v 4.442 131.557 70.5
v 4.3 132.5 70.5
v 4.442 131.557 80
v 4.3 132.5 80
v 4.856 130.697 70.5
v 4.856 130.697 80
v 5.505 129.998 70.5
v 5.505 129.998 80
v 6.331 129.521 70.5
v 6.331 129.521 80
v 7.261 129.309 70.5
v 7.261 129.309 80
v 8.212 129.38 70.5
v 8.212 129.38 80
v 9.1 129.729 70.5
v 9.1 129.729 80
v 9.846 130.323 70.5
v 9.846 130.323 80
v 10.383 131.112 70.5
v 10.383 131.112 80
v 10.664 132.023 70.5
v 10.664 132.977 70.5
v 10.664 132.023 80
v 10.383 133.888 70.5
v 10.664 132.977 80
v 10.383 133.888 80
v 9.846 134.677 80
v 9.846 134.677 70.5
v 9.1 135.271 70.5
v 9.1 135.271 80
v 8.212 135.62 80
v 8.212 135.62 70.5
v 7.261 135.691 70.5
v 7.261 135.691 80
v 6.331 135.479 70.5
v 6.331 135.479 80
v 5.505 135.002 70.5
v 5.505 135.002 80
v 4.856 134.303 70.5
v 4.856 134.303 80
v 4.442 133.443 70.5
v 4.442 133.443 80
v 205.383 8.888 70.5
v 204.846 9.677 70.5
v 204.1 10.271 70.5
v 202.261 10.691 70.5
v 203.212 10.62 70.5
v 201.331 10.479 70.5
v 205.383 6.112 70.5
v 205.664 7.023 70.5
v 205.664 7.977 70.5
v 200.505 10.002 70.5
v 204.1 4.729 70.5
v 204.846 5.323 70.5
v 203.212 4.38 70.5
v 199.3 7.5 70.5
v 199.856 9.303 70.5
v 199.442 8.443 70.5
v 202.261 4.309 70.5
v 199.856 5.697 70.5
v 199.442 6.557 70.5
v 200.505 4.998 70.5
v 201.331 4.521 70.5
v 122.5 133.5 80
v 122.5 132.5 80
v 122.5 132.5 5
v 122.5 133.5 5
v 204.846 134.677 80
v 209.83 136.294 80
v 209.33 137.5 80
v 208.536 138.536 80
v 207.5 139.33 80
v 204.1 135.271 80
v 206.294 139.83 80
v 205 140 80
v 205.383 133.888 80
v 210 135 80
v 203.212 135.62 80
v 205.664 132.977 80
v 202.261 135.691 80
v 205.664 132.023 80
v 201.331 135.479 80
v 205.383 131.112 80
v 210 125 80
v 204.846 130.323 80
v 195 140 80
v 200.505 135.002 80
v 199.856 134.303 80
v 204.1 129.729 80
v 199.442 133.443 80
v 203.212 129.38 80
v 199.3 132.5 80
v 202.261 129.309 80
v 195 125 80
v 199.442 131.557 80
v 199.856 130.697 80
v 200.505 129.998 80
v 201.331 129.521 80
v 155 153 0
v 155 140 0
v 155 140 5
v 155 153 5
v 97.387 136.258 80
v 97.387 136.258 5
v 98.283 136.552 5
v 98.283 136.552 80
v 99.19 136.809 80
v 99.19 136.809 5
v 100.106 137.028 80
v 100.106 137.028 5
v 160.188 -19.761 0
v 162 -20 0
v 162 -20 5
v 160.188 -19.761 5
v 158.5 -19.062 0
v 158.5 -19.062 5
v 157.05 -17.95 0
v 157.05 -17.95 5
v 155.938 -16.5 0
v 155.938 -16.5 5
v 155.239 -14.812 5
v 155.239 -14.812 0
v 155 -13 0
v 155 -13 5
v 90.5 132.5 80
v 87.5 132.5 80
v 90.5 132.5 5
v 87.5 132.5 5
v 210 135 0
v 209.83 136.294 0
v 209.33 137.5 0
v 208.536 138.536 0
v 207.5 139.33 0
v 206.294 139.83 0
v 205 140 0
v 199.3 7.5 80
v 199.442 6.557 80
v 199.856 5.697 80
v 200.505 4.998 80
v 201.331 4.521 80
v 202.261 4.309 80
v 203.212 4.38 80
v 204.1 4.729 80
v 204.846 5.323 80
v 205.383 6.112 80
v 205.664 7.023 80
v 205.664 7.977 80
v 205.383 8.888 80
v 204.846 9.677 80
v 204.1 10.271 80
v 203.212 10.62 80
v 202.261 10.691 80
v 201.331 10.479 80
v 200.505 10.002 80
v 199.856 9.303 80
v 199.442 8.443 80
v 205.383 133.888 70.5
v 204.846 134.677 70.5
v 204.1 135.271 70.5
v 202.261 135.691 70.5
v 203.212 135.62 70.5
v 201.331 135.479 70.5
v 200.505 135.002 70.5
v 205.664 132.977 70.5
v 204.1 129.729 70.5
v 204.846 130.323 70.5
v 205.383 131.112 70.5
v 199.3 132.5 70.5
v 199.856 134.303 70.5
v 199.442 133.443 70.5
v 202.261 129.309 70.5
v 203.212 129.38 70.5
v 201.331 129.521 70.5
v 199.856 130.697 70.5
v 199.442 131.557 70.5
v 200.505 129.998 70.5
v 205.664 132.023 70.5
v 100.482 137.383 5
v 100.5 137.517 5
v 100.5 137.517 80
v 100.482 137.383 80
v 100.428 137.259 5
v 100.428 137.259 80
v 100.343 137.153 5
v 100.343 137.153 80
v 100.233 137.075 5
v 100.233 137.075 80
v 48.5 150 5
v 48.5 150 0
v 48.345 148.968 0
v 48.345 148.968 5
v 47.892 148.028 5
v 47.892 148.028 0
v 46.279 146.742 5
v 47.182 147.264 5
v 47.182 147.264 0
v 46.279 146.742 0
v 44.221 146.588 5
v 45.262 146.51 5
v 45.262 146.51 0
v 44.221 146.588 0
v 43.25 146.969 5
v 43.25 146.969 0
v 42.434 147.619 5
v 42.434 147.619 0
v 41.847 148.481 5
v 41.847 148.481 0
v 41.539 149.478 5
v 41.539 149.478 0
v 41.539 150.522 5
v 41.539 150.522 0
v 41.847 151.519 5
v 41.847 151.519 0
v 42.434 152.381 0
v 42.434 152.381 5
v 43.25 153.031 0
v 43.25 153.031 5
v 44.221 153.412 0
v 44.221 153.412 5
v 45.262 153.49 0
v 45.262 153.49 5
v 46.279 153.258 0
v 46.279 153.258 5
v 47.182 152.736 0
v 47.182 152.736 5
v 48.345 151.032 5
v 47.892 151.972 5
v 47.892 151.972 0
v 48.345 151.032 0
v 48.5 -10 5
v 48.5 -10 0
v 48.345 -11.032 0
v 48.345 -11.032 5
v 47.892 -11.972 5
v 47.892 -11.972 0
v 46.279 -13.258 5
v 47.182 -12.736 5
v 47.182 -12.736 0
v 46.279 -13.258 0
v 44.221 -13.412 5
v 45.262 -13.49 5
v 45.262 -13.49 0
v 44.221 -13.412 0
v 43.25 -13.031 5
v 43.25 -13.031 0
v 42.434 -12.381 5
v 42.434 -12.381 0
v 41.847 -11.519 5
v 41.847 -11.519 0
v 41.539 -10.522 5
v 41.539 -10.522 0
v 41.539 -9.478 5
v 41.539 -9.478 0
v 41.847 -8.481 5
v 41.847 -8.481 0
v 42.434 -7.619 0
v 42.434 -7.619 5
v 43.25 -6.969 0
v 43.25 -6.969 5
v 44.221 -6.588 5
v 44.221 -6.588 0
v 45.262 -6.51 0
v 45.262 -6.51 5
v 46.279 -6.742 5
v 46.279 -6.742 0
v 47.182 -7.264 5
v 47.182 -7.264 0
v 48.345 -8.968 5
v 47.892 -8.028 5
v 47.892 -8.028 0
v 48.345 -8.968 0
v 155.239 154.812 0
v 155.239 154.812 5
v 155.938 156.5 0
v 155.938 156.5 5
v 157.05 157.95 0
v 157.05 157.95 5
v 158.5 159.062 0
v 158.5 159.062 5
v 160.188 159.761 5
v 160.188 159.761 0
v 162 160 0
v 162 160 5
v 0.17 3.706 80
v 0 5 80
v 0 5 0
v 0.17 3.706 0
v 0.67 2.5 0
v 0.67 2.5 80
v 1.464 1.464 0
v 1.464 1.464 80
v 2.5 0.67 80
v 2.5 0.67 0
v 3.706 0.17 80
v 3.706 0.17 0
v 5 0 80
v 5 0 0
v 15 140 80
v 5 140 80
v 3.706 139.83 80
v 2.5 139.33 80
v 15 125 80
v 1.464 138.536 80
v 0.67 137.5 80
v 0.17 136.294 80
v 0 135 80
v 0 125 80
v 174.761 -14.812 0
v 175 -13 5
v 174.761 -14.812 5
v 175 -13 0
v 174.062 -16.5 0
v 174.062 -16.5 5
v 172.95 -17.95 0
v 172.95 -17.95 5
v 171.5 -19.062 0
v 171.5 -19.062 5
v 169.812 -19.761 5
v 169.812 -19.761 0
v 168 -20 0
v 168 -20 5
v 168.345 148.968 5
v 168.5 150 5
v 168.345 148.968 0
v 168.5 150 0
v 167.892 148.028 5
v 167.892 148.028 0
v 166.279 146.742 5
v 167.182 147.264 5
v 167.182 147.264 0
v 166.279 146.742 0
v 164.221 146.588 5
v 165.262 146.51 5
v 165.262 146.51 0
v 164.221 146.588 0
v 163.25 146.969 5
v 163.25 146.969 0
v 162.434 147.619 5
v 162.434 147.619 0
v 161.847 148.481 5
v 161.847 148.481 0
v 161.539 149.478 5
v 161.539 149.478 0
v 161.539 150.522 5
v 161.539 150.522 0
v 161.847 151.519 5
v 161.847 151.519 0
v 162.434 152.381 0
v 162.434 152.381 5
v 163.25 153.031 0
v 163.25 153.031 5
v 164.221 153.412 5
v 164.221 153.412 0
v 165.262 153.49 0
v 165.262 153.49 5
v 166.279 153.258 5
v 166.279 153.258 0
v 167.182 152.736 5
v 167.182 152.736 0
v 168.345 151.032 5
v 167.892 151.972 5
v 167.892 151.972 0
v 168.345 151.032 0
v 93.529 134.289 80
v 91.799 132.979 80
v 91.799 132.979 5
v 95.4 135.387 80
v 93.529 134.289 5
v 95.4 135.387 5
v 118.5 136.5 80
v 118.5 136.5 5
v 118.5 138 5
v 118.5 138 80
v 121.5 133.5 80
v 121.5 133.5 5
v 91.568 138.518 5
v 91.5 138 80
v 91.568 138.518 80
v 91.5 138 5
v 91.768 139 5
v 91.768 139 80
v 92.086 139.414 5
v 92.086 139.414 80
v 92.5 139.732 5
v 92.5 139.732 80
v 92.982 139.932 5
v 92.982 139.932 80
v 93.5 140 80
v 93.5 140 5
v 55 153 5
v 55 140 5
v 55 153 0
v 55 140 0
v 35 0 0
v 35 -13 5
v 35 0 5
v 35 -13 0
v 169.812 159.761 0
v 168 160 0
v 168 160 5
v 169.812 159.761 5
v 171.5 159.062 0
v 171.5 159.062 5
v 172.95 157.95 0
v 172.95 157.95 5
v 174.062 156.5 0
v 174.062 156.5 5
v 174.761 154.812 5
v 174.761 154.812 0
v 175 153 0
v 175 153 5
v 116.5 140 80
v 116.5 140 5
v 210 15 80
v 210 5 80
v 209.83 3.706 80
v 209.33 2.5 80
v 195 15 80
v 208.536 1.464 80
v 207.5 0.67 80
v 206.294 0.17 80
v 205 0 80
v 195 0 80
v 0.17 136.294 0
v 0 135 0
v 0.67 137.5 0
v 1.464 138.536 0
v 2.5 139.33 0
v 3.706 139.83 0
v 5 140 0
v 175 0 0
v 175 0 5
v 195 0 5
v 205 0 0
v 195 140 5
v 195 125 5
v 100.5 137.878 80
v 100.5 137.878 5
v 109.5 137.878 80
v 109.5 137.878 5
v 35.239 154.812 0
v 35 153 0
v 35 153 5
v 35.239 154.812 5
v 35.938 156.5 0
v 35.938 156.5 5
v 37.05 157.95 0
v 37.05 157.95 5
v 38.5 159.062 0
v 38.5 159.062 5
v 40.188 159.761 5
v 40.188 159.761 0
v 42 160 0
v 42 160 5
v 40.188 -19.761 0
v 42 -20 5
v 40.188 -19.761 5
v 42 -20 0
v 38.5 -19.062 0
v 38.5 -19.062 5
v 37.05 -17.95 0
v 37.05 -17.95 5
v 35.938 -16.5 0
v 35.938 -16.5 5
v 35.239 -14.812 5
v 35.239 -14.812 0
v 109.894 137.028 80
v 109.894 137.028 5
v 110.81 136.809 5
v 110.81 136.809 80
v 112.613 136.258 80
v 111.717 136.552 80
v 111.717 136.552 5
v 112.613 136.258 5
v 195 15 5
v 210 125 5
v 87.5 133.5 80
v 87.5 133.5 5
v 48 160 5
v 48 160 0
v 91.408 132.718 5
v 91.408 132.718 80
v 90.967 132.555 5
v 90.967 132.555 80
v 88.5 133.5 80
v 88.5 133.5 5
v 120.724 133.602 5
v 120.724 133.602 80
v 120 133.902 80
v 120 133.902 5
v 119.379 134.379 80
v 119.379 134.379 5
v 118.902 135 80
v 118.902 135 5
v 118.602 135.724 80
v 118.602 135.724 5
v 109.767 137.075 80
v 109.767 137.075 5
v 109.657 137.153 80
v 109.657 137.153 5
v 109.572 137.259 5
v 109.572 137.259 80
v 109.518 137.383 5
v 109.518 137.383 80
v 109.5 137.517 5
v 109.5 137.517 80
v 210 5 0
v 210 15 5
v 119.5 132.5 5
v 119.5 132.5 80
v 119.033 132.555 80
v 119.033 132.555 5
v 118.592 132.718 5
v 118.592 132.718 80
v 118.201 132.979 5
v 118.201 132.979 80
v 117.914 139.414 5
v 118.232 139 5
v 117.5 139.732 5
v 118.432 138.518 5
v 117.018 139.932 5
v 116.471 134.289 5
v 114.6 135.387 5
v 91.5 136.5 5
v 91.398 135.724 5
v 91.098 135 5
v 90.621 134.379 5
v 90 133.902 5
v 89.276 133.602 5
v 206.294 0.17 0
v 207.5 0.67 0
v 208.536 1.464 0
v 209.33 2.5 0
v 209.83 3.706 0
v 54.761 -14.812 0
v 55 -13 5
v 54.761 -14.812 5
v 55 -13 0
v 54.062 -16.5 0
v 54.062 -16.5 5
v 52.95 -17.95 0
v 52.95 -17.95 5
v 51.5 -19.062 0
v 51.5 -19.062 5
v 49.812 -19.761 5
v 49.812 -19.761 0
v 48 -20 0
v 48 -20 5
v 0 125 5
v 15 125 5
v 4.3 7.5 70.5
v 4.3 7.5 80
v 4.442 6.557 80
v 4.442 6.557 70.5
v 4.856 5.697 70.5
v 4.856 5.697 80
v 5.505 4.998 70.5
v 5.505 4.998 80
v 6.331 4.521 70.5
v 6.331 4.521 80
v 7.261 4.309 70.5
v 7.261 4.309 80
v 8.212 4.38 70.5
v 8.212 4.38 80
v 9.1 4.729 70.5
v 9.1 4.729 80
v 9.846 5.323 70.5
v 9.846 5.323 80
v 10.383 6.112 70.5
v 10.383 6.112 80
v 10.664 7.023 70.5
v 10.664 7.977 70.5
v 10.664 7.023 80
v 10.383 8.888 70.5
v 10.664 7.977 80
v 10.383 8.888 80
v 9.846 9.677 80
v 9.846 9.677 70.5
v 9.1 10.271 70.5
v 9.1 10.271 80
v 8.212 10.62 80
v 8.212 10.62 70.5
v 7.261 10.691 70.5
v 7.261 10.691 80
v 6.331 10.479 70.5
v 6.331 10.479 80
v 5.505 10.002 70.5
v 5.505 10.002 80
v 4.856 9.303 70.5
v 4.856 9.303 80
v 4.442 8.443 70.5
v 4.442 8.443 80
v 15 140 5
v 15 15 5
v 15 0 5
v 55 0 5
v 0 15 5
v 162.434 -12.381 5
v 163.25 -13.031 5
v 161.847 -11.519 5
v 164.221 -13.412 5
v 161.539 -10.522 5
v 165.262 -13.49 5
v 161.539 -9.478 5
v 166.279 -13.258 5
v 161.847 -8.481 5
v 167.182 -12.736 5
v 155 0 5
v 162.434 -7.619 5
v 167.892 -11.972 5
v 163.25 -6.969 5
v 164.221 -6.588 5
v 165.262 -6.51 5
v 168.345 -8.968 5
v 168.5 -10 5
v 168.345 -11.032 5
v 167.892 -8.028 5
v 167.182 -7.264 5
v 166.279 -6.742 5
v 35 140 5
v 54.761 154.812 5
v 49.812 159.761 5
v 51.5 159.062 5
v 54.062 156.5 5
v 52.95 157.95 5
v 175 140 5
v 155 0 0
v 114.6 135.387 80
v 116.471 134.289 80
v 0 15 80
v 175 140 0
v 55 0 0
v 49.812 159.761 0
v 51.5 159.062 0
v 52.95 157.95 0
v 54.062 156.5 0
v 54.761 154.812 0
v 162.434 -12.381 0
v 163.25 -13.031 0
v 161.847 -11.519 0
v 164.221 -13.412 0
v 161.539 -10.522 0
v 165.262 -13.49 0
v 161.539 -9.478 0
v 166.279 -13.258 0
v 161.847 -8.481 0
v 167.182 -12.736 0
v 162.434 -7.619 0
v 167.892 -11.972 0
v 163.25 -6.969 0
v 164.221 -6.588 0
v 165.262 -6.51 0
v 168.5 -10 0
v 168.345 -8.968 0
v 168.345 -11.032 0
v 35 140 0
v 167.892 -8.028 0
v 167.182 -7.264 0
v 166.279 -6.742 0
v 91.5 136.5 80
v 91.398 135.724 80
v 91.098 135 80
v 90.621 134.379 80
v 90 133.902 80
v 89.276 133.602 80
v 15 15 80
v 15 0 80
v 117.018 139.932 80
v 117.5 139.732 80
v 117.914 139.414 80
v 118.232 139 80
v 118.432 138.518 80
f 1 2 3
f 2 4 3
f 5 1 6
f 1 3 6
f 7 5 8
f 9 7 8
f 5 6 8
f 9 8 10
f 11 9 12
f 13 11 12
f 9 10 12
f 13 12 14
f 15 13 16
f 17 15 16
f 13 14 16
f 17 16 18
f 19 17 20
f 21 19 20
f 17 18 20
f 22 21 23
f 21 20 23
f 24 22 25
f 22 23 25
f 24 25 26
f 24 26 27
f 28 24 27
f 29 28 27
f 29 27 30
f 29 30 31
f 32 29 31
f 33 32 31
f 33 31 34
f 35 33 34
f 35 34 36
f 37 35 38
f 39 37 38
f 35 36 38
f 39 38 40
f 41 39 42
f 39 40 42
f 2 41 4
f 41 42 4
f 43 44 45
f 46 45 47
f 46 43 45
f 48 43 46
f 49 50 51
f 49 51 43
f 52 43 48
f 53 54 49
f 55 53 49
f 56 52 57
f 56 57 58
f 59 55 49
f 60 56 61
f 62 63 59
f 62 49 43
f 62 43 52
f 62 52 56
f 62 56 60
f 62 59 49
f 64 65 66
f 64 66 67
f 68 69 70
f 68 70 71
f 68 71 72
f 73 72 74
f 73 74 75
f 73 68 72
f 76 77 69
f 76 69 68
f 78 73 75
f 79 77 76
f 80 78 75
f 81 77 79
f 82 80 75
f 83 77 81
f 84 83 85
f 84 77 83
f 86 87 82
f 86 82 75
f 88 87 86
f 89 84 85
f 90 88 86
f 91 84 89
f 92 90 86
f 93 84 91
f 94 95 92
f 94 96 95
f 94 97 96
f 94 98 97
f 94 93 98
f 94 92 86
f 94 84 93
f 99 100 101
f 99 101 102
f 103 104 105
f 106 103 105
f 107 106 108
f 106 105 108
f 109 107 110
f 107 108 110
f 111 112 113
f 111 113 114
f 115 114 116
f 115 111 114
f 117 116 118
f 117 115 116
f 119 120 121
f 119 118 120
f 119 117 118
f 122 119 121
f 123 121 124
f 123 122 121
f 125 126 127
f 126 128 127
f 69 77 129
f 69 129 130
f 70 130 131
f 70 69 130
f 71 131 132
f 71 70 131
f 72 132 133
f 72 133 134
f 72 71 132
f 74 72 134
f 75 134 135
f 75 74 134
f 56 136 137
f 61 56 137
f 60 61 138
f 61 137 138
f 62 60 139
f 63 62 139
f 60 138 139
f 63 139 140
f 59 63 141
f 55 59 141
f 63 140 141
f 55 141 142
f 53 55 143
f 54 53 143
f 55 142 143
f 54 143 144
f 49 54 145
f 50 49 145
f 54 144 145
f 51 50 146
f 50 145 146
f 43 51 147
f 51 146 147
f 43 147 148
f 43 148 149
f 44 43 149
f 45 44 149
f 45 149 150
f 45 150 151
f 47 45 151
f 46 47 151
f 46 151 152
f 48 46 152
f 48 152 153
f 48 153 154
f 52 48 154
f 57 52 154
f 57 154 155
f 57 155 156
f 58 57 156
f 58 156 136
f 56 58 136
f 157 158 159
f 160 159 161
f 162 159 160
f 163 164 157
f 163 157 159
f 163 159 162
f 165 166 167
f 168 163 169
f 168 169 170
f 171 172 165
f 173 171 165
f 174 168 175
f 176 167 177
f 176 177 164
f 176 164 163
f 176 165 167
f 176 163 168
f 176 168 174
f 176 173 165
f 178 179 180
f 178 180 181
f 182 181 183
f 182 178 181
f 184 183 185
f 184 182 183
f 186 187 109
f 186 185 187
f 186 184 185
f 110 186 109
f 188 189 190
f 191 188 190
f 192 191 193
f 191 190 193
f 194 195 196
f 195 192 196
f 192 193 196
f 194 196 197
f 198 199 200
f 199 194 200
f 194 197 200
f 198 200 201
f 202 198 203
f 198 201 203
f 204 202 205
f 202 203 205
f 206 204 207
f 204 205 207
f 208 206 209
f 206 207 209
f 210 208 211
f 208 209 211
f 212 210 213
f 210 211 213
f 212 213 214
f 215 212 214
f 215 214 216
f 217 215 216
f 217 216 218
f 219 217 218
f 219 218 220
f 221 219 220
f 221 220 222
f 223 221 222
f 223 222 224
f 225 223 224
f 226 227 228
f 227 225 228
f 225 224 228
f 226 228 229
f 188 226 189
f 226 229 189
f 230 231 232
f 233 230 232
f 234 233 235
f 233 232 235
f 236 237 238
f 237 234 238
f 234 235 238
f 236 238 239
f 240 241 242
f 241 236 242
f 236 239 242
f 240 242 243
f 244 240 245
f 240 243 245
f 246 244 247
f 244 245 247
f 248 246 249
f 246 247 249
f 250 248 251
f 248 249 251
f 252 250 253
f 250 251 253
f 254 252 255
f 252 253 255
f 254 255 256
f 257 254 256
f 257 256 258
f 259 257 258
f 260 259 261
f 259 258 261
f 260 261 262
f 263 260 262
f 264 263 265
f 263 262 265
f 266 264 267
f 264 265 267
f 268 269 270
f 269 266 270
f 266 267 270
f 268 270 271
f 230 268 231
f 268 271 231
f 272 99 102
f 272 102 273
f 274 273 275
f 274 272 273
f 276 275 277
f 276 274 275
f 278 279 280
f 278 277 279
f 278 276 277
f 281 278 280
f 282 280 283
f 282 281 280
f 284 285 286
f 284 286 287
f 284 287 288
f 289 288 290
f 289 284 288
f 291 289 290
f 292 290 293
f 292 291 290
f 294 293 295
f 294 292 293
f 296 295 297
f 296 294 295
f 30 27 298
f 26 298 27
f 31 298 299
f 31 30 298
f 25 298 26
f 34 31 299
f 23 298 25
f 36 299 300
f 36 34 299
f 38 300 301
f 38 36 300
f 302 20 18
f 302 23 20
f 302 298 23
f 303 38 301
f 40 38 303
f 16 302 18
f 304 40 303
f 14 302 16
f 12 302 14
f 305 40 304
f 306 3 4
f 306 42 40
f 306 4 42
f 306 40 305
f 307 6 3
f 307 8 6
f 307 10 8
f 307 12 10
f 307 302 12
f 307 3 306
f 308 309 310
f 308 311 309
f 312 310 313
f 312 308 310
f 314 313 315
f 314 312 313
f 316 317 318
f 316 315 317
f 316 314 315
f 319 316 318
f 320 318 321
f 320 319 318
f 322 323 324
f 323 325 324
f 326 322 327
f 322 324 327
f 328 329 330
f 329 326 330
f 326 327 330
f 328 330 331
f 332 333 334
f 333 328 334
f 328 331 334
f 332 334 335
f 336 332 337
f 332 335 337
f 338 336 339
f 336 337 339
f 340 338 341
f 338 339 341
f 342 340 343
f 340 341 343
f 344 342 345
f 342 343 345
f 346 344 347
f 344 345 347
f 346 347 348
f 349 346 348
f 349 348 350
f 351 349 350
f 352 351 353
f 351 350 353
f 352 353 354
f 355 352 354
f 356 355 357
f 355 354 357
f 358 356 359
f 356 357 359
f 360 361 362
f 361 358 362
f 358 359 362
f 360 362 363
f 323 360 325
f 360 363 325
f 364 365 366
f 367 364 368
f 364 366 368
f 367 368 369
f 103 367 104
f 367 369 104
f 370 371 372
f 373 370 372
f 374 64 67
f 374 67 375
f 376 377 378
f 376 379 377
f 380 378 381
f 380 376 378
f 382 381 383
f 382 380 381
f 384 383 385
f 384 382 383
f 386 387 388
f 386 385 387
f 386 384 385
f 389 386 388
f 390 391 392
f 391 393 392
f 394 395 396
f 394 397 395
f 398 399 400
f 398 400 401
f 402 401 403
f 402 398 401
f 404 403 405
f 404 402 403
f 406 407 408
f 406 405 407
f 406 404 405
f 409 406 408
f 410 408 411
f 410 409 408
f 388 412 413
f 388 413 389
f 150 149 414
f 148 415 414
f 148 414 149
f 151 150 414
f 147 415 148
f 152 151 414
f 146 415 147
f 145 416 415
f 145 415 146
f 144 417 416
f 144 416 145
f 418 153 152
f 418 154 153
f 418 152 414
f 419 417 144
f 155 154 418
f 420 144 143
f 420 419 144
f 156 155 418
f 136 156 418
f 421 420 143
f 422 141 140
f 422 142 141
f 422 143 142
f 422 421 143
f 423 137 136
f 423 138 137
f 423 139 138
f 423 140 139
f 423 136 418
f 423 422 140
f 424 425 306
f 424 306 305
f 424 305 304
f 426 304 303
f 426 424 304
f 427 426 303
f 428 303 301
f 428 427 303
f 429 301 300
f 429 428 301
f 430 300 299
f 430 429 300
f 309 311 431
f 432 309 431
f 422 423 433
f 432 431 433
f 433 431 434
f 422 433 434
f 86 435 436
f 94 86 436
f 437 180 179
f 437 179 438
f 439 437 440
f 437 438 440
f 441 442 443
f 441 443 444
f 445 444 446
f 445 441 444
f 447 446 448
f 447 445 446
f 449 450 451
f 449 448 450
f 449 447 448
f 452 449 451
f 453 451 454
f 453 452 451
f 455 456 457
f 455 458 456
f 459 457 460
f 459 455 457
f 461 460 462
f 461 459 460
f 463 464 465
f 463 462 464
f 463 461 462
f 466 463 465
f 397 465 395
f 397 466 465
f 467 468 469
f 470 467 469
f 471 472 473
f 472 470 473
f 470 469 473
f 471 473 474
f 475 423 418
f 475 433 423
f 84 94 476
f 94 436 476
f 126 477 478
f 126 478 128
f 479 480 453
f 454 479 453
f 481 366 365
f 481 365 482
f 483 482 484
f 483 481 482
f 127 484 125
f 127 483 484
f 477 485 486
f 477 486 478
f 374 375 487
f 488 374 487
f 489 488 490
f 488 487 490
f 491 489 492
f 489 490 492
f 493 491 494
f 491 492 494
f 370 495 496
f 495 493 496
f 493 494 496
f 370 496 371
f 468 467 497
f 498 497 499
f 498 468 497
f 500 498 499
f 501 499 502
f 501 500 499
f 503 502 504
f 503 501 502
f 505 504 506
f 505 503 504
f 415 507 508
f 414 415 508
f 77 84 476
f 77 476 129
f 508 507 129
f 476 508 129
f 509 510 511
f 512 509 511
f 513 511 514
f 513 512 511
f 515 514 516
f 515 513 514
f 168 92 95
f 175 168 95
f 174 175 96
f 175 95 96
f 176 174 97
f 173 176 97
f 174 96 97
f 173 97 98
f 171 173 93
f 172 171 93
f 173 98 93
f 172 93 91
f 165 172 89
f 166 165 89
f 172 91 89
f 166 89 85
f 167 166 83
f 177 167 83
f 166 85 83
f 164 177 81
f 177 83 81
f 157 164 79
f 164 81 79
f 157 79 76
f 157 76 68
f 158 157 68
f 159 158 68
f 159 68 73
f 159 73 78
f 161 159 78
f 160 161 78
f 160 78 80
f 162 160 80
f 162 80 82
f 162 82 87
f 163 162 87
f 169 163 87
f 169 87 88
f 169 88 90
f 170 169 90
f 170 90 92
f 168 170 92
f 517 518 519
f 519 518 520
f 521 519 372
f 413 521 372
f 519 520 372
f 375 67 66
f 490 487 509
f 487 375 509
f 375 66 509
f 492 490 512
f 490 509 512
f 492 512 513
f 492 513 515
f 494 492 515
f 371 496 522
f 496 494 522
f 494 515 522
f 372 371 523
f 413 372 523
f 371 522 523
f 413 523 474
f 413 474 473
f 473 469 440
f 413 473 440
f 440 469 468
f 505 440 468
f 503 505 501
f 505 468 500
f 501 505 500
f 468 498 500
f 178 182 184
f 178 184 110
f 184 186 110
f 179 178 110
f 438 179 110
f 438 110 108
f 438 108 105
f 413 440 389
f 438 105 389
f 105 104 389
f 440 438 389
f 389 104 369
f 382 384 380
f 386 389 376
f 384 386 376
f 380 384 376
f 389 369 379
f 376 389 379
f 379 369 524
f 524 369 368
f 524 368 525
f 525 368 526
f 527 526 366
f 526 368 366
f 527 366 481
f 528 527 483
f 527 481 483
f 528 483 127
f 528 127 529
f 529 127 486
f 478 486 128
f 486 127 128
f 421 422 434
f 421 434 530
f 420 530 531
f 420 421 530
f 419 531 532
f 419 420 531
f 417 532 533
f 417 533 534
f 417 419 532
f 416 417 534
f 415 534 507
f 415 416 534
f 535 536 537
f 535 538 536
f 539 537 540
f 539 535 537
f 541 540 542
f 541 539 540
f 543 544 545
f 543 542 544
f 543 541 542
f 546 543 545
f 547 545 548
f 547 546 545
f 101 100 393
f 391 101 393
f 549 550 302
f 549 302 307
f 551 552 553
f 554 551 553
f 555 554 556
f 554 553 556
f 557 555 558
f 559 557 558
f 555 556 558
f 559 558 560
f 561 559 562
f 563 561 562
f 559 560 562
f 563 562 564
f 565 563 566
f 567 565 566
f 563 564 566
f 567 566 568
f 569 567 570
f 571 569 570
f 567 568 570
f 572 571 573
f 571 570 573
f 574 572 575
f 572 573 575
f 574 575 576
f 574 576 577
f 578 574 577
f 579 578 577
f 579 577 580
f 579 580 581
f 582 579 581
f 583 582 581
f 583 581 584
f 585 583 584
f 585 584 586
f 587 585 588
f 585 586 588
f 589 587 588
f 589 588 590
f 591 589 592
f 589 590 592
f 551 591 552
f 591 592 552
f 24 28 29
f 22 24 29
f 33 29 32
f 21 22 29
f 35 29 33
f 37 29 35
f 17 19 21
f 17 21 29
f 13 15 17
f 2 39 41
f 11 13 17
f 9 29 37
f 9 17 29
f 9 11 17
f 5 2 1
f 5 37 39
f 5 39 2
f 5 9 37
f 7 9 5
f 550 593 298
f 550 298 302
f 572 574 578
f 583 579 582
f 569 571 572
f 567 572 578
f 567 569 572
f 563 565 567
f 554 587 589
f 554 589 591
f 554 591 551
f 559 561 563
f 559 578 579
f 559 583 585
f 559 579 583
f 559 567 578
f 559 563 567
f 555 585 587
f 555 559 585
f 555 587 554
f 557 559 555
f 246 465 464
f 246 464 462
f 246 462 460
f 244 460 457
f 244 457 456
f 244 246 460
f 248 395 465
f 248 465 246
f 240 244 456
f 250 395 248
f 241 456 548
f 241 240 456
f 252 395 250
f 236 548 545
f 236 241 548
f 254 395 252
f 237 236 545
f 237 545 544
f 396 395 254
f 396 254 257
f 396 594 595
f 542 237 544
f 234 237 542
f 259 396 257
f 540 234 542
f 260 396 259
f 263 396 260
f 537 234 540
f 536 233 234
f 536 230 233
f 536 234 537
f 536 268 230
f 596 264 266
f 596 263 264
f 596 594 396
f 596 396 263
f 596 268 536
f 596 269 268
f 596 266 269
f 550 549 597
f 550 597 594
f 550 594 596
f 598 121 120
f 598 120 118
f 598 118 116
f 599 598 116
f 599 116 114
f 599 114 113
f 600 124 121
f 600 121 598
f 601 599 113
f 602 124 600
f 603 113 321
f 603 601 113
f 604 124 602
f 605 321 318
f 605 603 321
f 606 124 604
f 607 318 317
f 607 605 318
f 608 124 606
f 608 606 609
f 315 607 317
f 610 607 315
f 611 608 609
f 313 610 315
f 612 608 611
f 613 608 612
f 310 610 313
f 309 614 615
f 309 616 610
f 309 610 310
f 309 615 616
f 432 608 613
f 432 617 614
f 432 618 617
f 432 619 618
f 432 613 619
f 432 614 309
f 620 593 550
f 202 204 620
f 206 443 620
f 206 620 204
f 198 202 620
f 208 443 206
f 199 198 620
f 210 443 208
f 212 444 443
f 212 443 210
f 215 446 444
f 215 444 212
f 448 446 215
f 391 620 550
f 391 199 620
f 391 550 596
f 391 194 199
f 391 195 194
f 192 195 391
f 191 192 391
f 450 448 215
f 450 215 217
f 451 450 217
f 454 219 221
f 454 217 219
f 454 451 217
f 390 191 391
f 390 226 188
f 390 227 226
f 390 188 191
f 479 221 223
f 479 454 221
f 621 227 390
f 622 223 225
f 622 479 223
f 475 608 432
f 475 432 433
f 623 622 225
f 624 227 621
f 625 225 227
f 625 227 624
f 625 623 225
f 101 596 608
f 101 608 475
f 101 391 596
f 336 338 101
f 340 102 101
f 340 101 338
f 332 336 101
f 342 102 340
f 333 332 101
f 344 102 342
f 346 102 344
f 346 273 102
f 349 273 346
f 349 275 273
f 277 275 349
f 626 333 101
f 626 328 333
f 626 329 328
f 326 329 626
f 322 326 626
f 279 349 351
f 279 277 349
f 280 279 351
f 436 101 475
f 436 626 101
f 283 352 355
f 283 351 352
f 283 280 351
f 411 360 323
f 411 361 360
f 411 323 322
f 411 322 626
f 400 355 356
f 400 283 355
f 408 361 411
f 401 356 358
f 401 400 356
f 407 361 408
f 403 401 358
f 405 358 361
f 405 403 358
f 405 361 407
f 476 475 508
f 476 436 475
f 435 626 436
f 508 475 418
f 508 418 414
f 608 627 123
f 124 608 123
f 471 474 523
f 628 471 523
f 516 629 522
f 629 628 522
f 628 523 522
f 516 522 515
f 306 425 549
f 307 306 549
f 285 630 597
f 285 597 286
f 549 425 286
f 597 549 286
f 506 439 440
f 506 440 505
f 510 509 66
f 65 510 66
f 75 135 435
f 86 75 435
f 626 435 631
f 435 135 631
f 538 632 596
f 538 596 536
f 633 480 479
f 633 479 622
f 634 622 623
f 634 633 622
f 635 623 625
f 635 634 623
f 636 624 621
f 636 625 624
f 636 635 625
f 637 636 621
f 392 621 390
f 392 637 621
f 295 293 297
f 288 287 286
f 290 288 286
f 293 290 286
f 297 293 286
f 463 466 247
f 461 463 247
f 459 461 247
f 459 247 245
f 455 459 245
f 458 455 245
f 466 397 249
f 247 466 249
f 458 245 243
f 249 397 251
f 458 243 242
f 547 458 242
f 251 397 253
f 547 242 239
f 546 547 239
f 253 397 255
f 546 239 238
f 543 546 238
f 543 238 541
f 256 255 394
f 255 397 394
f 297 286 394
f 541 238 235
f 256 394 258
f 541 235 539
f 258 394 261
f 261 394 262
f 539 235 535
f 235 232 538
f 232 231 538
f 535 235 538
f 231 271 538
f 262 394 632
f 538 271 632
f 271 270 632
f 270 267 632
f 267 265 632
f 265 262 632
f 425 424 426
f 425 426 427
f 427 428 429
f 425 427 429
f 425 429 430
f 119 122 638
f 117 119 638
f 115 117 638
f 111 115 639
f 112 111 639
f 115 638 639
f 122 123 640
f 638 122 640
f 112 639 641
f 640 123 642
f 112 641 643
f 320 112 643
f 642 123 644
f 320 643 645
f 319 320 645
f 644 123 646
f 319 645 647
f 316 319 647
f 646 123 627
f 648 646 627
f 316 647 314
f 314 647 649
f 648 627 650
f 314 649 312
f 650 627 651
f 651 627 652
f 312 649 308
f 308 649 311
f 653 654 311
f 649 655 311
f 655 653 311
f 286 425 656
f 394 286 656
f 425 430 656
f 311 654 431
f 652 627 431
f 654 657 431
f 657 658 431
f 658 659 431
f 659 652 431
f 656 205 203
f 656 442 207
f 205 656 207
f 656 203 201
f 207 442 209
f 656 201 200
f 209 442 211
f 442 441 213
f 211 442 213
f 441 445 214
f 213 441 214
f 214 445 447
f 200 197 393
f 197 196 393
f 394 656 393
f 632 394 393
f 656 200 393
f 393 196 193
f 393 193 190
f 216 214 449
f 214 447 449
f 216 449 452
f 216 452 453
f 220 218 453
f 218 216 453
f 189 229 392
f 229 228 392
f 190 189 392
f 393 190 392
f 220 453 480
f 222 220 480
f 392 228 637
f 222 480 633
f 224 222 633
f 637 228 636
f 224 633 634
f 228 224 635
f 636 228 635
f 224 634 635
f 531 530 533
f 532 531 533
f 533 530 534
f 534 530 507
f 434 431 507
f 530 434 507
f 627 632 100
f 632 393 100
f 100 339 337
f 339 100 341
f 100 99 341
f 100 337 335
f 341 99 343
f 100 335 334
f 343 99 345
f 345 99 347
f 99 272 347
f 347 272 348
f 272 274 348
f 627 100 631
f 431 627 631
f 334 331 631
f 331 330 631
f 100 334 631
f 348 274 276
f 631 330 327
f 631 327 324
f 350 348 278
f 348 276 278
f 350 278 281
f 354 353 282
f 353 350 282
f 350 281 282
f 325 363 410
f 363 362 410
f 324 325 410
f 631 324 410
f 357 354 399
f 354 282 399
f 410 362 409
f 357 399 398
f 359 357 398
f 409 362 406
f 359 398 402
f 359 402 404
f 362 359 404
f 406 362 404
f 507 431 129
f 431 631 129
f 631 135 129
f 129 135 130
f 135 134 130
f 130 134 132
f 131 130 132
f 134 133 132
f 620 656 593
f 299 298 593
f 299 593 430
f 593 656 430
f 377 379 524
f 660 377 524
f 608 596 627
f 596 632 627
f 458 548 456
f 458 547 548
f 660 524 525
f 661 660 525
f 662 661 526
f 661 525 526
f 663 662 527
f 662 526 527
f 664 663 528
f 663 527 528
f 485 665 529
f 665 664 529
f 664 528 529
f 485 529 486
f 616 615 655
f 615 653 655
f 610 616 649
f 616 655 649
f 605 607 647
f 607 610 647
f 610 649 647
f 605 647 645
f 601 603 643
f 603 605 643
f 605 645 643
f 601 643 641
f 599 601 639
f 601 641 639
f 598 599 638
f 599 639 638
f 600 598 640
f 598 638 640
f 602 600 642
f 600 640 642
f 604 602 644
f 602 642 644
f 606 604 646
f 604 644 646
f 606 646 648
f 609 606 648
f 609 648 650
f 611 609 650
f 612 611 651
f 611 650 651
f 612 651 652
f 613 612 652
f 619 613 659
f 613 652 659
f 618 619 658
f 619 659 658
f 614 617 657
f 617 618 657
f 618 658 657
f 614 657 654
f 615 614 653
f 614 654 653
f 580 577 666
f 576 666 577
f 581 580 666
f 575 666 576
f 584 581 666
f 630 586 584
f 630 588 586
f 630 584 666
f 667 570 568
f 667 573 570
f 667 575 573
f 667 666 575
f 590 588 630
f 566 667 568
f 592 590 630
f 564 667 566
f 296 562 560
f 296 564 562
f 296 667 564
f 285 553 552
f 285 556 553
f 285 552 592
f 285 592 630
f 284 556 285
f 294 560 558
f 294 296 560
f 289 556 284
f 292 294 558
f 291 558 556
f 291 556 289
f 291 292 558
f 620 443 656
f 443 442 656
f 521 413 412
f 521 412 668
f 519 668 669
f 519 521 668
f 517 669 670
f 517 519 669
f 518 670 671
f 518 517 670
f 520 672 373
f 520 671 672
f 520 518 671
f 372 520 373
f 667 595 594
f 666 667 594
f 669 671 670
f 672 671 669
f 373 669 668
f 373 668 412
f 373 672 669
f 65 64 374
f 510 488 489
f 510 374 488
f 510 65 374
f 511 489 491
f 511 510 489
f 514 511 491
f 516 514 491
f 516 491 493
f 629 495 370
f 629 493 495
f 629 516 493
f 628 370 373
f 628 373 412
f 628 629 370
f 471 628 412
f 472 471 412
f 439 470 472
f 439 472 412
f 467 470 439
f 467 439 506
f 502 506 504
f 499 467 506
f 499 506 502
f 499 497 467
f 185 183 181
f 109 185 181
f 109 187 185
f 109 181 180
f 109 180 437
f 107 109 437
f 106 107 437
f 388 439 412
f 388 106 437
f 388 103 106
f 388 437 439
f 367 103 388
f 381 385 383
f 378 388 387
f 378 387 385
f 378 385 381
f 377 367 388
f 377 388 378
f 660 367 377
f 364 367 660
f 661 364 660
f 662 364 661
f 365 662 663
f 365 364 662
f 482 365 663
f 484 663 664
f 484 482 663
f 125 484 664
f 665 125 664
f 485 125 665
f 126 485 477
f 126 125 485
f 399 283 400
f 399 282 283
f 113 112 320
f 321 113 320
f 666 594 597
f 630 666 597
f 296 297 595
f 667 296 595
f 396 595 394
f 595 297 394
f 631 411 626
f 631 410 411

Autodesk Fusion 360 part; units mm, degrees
sketch "Sketch1" plane through (0, 0, 0) normal (0, 0, 1) x (1, 0, 0)
  line L0 (0, 0) -> (210, 0)
  line L1 (210, 0) -> (210, 140)
  line L2 (210, 140) -> (0, 140)
  line L3 (0, 140) -> (0, 0)
  line L4 (35, 140) -> (55, 140)
  line L5 (55, 140) -> (55, 153)
  line L6 (48, 160) -> (42, 160)
  line L7 (35, 153) -> (35, 140)
  line L8 (0, 70) -> (210, 70)
  line L9 (105, 140) -> (105, 0)
  circle A0 centre (45, 150) radius 3.5
  arc A1 (42, 160) -> (35, 153) centre (42, 153) ccw
  arc A2 (55, 153) -> (48, 160) centre (48, 153) ccw
  arc A3 (35, -13) -> (42, -20) centre (42, -13) ccw
  line L10 (48, -20) -> (42, -20)
  circle A4 centre (45, -10) radius 3.5
  arc A5 (48, -20) -> (55, -13) centre (48, -13) ccw
  line L11 (35, -13) -> (35, 0)
  line L12 (55, 0) -> (55, -13)
  arc A6 (162, 160) -> (155, 153) centre (162, 153) ccw
  arc A7 (175, 153) -> (168, 160) centre (168, 153) ccw
  line L13 (162, 160) -> (168, 160)
  circle A8 centre (165, 150) radius 3.5
  line L14 (175, 153) -> (175, 140)
  line L15 (155, 140) -> (155, 153)
  arc A9 (155, -13) -> (162, -20) centre (162, -13) ccw
  circle A10 centre (165, -10) radius 3.5
  line L16 (162, -20) -> (168, -20)
  arc A11 (168, -20) -> (175, -13) centre (168, -13) ccw
  line L17 (155, 0) -> (155, -13)
  line L18 (175, -13) -> (175, 0)
  point P0 (35, 160)
  point P1 (35, -20)
  point P2 (175, 160)
  point P3 (175, -20)
  dimension "d1" = 210
  dimension "d2" = 140
  dimension "d3" = 20
  dimension "d4" = 20
  dimension "d5" = 35
  dimension "d6" = 7
  dimension "d7" = 10
  dimension "d8" = 10
  dimension "d9" = 7
extrude "Extrude1" add sketch "Sketch1" along normal blind 5 makes body 1
sketch "Sketch2" plane through (0, 0, 5) normal (0, 0, 1) x (-1, 0, 0)
  circle A0 centre (-45, 10) radius 3.5
  circle A1 centre (-45, -150) radius 3.5
  circle A2 centre (-165, -150) radius 3.5
  circle A3 centre (-165, 10) radius 3.5
  line L0 (-55, 0) -> (-155, 0)
  line L1 (-155, 0) -> (-155, 13)
  arc A4 (-155, 13) -> (-162, 20) centre (-162, 13) ccw
  line L2 (-162, 20) -> (-168, 20)
  arc A5 (-168, 20) -> (-175, 13) centre (-168, 13) ccw
  line L3 (-175, 13) -> (-175, 0)
  line L4 (-175, 0) -> (-210, 0)
  line L5 (-210, 0) -> (-210, -140)
  line L6 (-210, -140) -> (-175, -140)
  line L7 (-175, -140) -> (-175, -153)
  arc A6 (-175, -153) -> (-168, -160) centre (-168, -153) ccw
  line L8 (-168, -160) -> (-162, -160)
  arc A7 (-162, -160) -> (-155, -153) centre (-162, -153) ccw
  line L9 (-155, -153) -> (-155, -140)
  line L10 (-155, -140) -> (-55, -140)
  line L11 (-55, -140) -> (-55, -153)
  arc A8 (-55, -153) -> (-48, -160) centre (-48, -153) ccw
  line L12 (-48, -160) -> (-42, -160)
  arc A9 (-42, -160) -> (-35, -153) centre (-42, -153) ccw
  line L13 (-35, -153) -> (-35, -140)
  line L14 (-35, -140) -> (0, -140)
  line L15 (0, -140) -> (0, 0)
  line L16 (0, 0) -> (-35, 0)
  line L17 (-35, 0) -> (-35, 13)
  arc A10 (-35, 13) -> (-42, 20) centre (-42, 13) ccw
  line L18 (-42, 20) -> (-48, 20)
  arc A11 (-48, 20) -> (-55, 13) centre (-48, 13) ccw
  line L19 (-55, 13) -> (-55, 0)
  line L20 (0, -140) -> (-15, -140)
  line L21 (-15, -140) -> (-15, -125)
  line L22 (-15, -125) -> (0, -125)
  line L23 (0, -125) -> (0, -140)
  line L24 (-210, -140) -> (-195, -140)
  line L25 (-195, -140) -> (-195, -125)
  line L26 (-195, -125) -> (-210, -125)
  line L27 (-210, -125) -> (-210, -140)
  line L28 (0, 0) -> (-15, 0)
  line L29 (-15, 0) -> (-15, -15)
  line L30 (-15, -15) -> (0, -15)
  line L31 (0, -15) -> (0, 0)
  line L32 (-210, 0) -> (-195, 0)
  line L33 (-195, 0) -> (-195, -15)
  line L34 (-195, -15) -> (-210, -15)
  line L35 (-210, -15) -> (-210, 0)
  dimension "d12" = 15
  dimension "d13" = 15
  dimension "d14" = 15
  dimension "d15" = 15
  dimension "d16" = 15
  dimension "d17" = 15
  dimension "d18" = 15
  dimension "d19" = 15
extrude "Extrude2" add sketch "Sketch2" along normal blind 75 contours L15 L16 L28 L29 L30 L31 | L4 L5 L32 L33 L34 L35 | L14 L15 L20 L21 L22 L23 | L5 L6 L24 L25 L26 L27 bodies 1
fillet "Fillet1" radius 5 4 edges at (0, 140, 40) (0, 0, 40) (210, 140, 40) (210, 0, 40) on bodies 1
sketch "Sketch3" plane through (0, 0, 5) normal (0, 0, 1) x (-1, 0, 0)
  line L0 (-15, -15) -> (-15, 0)
  line L1 (-15, 0) -> (-35, 0)
  line L2 (-35, 0) -> (-35, 13)
  arc A0 (-35, 13) -> (-42, 20) centre (-42, 13) ccw
  line L3 (-42, 20) -> (-48, 20)
  arc A1 (-48, 20) -> (-55, 13) centre (-48, 13) ccw
  line L4 (-55, 13) -> (-55, 0)
  line L5 (-55, 0) -> (-155, 0)
  line L6 (-155, 0) -> (-155, 13)
  arc A2 (-155, 13) -> (-162, 20) centre (-162, 13) ccw
  line L7 (-162, 20) -> (-168, 20)
  arc A3 (-168, 20) -> (-175, 13) centre (-168, 13) ccw
  line L8 (-175, 13) -> (-175, 0)
  line L9 (-175, 0) -> (-195, 0)
  line L10 (-195, 0) -> (-195, -15)
  line L11 (-195, -15) -> (-210, -15)
  line L12 (-210, -15) -> (-210, -125)
  line L13 (-210, -125) -> (-195, -125)
  line L14 (-195, -125) -> (-195, -140)
  line L15 (-195, -140) -> (-175, -140)
  line L16 (-175, -140) -> (-175, -153)
  arc A4 (-175, -153) -> (-168, -160) centre (-168, -153) ccw
  line L17 (-168, -160) -> (-162, -160)
  arc A5 (-162, -160) -> (-155, -153) centre (-162, -153) ccw
  line L18 (-155, -153) -> (-155, -140)
  line L19 (-155, -140) -> (-55, -140)
  line L20 (-55, -140) -> (-55, -153)
  arc A6 (-55, -153) -> (-48, -160) centre (-48, -153) ccw
  line L21 (-48, -160) -> (-42, -160)
  arc A7 (-42, -160) -> (-35, -153) centre (-42, -153) ccw
  line L22 (-35, -153) -> (-35, -140)
  line L23 (-35, -140) -> (-15, -140)
  line L24 (-15, -140) -> (-15, -125)
  line L25 (-15, -125) -> (0, -125)
  line L26 (0, -125) -> (0, -15)
  line L27 (0, -15) -> (-15, -15)
  circle A8 centre (-45, 10) radius 3.5
  circle A9 centre (-45, -150) radius 3.5
  circle A10 centre (-165, -150) radius 3.5
  circle A11 centre (-165, 10) radius 3.5
  line L28 (-116.5, -140) -> (-93.5, -140)
  line L29 (-87.5, -133.5) -> (-87.5, -132.5)
  arc A12 (-100.1064, -137.0284) -> (-100.5, -137.5169) centre (-100, -137.5169) ccw
  arc A13 (-90.5, -132.5) -> (-91.7987, -132.979) centre (-90.5, -134.5) ccw
  line L30 (-119.5, -132.5) -> (-122.5, -132.5)
  arc A14 (-88.5, -133.5) -> (-91.5, -136.5) centre (-88.5, -136.5) ccw
  arc A15 (-112.6132, -136.2584) -> (-112.4547, -136.3163) centre (-106.1884, -118.9099) ccw
  arc A16 (-97.3868, -136.2584) -> (-97.2095, -136.1954) centre (-105, -114.555) ccw
  line L31 (-112.4547, -136.3163) -> (-112.7905, -136.1954)
  arc A17 (-97.3868, -136.2584) -> (-91.7987, -132.979) centre (-103.8116, -118.9099) ccw
  arc A18 (-112.6132, -136.2584) -> (-109.8936, -137.0284) centre (-105, -114.555) ccw
  arc A19 (-118.5, -138) -> (-116.5, -140) centre (-116.5, -138) ccw
  line L32 (-122.5, -132.5) -> (-122.5, -133.5)
  line L33 (-109.5, -137.8785) -> (-109.5, -137.5169)
  arc A20 (-93.5, -140) -> (-91.5, -138) centre (-93.5, -138) ccw
  arc A21 (-118.5, -136.5) -> (-121.5, -133.5) centre (-121.5, -136.5) ccw
  line L34 (-118.5, -136.5) -> (-118.5, -138)
  line L35 (-91.5, -138) -> (-91.5, -136.5)
  line L36 (-87.5, -132.5) -> (-90.5, -132.5)
  line L37 (-122.5, -133.5) -> (-121.5, -133.5)
  line L38 (-100.5, -137.5169) -> (-100.5, -137.8785)
  arc A22 (-118.2013, -132.979) -> (-112.6132, -136.2584) centre (-106.1884, -118.9099) ccw
  arc A23 (-118.2013, -132.979) -> (-119.5, -132.5) centre (-119.5, -134.5) ccw
  line L39 (-97.2095, -136.1954) -> (-97.5453, -136.3163)
  line L40 (-88.5, -133.5) -> (-87.5, -133.5)
  arc A24 (-112.7905, -136.1954) -> (-112.6132, -136.2584) centre (-105, -114.555) ccw
  arc A25 (-97.5453, -136.3163) -> (-97.3868, -136.2584) centre (-103.8116, -118.9099) ccw
  line L41 (-100.5, -137.8785) -> (-109.5, -137.8785)
  arc A26 (-100.1064, -137.0284) -> (-97.3868, -136.2584) centre (-105, -114.555) ccw
  arc A27 (-109.5, -137.5169) -> (-109.8936, -137.0284) centre (-110, -137.5169) ccw
  point P0 (-105, -140)
extrude "Extrude3" add sketch "Sketch3" along normal blind 75 separate body contours L19 L28 L29 A12 A13 L30 A14 A17 A18 A19 L32 L33 A20 A21 L34 L35 L36 L37 L38 A22 A23 L40 L41 A26 A27 makes body 2
sketch "Sketch4" plane through (0, 0, 80) normal (0, 0, 1) x (-1, 0, 0)
  arc A0 (-5, -140) -> (0, -135) centre (-5, -135) ccw
  line L0 (0, -135) -> (0, -125)
  line L1 (0, -125) -> (-15, -125)
  line L2 (-15, -125) -> (-15, -140)
  line L3 (-15, -140) -> (-5, -140)
  circle A1 centre (-7.5, -132.5) radius 3.2
  circle A2 centre (-202.5, -132.5) radius 3.2
  line L4 (-205, -140) -> (-195, -140)
  line L5 (-195, -140) -> (-195, -125)
  circle A3 centre (-202.5, -7.5) radius 3.2
  line L6 (-210, -5) -> (-210, -15)
  line L7 (-210, -15) -> (-195, -15)
  circle A4 centre (-7.5, -7.5) radius 3.2
  line L8 (-15, -15) -> (0, -15)
  line L9 (-15, 0) -> (-15, -15)
  dimension "d26" = 6.4
  dimension "d27" = 7.5
  dimension "d28" = 7.5
  dimension "d29" = 6.4
  dimension "d30" = 7.5
  dimension "d31" = 7.5
  dimension "d32" = 6.4
  dimension "d33" = 7.5
  dimension "d34" = 7.5
  dimension "d35" = 6.4
  dimension "d36" = 7.5
  dimension "d37" = 7.5
extrude "Extrude4" cut sketch "Sketch4" against normal blind 9.5 contours A1 | A2 | A3 | A4 bodies 1
